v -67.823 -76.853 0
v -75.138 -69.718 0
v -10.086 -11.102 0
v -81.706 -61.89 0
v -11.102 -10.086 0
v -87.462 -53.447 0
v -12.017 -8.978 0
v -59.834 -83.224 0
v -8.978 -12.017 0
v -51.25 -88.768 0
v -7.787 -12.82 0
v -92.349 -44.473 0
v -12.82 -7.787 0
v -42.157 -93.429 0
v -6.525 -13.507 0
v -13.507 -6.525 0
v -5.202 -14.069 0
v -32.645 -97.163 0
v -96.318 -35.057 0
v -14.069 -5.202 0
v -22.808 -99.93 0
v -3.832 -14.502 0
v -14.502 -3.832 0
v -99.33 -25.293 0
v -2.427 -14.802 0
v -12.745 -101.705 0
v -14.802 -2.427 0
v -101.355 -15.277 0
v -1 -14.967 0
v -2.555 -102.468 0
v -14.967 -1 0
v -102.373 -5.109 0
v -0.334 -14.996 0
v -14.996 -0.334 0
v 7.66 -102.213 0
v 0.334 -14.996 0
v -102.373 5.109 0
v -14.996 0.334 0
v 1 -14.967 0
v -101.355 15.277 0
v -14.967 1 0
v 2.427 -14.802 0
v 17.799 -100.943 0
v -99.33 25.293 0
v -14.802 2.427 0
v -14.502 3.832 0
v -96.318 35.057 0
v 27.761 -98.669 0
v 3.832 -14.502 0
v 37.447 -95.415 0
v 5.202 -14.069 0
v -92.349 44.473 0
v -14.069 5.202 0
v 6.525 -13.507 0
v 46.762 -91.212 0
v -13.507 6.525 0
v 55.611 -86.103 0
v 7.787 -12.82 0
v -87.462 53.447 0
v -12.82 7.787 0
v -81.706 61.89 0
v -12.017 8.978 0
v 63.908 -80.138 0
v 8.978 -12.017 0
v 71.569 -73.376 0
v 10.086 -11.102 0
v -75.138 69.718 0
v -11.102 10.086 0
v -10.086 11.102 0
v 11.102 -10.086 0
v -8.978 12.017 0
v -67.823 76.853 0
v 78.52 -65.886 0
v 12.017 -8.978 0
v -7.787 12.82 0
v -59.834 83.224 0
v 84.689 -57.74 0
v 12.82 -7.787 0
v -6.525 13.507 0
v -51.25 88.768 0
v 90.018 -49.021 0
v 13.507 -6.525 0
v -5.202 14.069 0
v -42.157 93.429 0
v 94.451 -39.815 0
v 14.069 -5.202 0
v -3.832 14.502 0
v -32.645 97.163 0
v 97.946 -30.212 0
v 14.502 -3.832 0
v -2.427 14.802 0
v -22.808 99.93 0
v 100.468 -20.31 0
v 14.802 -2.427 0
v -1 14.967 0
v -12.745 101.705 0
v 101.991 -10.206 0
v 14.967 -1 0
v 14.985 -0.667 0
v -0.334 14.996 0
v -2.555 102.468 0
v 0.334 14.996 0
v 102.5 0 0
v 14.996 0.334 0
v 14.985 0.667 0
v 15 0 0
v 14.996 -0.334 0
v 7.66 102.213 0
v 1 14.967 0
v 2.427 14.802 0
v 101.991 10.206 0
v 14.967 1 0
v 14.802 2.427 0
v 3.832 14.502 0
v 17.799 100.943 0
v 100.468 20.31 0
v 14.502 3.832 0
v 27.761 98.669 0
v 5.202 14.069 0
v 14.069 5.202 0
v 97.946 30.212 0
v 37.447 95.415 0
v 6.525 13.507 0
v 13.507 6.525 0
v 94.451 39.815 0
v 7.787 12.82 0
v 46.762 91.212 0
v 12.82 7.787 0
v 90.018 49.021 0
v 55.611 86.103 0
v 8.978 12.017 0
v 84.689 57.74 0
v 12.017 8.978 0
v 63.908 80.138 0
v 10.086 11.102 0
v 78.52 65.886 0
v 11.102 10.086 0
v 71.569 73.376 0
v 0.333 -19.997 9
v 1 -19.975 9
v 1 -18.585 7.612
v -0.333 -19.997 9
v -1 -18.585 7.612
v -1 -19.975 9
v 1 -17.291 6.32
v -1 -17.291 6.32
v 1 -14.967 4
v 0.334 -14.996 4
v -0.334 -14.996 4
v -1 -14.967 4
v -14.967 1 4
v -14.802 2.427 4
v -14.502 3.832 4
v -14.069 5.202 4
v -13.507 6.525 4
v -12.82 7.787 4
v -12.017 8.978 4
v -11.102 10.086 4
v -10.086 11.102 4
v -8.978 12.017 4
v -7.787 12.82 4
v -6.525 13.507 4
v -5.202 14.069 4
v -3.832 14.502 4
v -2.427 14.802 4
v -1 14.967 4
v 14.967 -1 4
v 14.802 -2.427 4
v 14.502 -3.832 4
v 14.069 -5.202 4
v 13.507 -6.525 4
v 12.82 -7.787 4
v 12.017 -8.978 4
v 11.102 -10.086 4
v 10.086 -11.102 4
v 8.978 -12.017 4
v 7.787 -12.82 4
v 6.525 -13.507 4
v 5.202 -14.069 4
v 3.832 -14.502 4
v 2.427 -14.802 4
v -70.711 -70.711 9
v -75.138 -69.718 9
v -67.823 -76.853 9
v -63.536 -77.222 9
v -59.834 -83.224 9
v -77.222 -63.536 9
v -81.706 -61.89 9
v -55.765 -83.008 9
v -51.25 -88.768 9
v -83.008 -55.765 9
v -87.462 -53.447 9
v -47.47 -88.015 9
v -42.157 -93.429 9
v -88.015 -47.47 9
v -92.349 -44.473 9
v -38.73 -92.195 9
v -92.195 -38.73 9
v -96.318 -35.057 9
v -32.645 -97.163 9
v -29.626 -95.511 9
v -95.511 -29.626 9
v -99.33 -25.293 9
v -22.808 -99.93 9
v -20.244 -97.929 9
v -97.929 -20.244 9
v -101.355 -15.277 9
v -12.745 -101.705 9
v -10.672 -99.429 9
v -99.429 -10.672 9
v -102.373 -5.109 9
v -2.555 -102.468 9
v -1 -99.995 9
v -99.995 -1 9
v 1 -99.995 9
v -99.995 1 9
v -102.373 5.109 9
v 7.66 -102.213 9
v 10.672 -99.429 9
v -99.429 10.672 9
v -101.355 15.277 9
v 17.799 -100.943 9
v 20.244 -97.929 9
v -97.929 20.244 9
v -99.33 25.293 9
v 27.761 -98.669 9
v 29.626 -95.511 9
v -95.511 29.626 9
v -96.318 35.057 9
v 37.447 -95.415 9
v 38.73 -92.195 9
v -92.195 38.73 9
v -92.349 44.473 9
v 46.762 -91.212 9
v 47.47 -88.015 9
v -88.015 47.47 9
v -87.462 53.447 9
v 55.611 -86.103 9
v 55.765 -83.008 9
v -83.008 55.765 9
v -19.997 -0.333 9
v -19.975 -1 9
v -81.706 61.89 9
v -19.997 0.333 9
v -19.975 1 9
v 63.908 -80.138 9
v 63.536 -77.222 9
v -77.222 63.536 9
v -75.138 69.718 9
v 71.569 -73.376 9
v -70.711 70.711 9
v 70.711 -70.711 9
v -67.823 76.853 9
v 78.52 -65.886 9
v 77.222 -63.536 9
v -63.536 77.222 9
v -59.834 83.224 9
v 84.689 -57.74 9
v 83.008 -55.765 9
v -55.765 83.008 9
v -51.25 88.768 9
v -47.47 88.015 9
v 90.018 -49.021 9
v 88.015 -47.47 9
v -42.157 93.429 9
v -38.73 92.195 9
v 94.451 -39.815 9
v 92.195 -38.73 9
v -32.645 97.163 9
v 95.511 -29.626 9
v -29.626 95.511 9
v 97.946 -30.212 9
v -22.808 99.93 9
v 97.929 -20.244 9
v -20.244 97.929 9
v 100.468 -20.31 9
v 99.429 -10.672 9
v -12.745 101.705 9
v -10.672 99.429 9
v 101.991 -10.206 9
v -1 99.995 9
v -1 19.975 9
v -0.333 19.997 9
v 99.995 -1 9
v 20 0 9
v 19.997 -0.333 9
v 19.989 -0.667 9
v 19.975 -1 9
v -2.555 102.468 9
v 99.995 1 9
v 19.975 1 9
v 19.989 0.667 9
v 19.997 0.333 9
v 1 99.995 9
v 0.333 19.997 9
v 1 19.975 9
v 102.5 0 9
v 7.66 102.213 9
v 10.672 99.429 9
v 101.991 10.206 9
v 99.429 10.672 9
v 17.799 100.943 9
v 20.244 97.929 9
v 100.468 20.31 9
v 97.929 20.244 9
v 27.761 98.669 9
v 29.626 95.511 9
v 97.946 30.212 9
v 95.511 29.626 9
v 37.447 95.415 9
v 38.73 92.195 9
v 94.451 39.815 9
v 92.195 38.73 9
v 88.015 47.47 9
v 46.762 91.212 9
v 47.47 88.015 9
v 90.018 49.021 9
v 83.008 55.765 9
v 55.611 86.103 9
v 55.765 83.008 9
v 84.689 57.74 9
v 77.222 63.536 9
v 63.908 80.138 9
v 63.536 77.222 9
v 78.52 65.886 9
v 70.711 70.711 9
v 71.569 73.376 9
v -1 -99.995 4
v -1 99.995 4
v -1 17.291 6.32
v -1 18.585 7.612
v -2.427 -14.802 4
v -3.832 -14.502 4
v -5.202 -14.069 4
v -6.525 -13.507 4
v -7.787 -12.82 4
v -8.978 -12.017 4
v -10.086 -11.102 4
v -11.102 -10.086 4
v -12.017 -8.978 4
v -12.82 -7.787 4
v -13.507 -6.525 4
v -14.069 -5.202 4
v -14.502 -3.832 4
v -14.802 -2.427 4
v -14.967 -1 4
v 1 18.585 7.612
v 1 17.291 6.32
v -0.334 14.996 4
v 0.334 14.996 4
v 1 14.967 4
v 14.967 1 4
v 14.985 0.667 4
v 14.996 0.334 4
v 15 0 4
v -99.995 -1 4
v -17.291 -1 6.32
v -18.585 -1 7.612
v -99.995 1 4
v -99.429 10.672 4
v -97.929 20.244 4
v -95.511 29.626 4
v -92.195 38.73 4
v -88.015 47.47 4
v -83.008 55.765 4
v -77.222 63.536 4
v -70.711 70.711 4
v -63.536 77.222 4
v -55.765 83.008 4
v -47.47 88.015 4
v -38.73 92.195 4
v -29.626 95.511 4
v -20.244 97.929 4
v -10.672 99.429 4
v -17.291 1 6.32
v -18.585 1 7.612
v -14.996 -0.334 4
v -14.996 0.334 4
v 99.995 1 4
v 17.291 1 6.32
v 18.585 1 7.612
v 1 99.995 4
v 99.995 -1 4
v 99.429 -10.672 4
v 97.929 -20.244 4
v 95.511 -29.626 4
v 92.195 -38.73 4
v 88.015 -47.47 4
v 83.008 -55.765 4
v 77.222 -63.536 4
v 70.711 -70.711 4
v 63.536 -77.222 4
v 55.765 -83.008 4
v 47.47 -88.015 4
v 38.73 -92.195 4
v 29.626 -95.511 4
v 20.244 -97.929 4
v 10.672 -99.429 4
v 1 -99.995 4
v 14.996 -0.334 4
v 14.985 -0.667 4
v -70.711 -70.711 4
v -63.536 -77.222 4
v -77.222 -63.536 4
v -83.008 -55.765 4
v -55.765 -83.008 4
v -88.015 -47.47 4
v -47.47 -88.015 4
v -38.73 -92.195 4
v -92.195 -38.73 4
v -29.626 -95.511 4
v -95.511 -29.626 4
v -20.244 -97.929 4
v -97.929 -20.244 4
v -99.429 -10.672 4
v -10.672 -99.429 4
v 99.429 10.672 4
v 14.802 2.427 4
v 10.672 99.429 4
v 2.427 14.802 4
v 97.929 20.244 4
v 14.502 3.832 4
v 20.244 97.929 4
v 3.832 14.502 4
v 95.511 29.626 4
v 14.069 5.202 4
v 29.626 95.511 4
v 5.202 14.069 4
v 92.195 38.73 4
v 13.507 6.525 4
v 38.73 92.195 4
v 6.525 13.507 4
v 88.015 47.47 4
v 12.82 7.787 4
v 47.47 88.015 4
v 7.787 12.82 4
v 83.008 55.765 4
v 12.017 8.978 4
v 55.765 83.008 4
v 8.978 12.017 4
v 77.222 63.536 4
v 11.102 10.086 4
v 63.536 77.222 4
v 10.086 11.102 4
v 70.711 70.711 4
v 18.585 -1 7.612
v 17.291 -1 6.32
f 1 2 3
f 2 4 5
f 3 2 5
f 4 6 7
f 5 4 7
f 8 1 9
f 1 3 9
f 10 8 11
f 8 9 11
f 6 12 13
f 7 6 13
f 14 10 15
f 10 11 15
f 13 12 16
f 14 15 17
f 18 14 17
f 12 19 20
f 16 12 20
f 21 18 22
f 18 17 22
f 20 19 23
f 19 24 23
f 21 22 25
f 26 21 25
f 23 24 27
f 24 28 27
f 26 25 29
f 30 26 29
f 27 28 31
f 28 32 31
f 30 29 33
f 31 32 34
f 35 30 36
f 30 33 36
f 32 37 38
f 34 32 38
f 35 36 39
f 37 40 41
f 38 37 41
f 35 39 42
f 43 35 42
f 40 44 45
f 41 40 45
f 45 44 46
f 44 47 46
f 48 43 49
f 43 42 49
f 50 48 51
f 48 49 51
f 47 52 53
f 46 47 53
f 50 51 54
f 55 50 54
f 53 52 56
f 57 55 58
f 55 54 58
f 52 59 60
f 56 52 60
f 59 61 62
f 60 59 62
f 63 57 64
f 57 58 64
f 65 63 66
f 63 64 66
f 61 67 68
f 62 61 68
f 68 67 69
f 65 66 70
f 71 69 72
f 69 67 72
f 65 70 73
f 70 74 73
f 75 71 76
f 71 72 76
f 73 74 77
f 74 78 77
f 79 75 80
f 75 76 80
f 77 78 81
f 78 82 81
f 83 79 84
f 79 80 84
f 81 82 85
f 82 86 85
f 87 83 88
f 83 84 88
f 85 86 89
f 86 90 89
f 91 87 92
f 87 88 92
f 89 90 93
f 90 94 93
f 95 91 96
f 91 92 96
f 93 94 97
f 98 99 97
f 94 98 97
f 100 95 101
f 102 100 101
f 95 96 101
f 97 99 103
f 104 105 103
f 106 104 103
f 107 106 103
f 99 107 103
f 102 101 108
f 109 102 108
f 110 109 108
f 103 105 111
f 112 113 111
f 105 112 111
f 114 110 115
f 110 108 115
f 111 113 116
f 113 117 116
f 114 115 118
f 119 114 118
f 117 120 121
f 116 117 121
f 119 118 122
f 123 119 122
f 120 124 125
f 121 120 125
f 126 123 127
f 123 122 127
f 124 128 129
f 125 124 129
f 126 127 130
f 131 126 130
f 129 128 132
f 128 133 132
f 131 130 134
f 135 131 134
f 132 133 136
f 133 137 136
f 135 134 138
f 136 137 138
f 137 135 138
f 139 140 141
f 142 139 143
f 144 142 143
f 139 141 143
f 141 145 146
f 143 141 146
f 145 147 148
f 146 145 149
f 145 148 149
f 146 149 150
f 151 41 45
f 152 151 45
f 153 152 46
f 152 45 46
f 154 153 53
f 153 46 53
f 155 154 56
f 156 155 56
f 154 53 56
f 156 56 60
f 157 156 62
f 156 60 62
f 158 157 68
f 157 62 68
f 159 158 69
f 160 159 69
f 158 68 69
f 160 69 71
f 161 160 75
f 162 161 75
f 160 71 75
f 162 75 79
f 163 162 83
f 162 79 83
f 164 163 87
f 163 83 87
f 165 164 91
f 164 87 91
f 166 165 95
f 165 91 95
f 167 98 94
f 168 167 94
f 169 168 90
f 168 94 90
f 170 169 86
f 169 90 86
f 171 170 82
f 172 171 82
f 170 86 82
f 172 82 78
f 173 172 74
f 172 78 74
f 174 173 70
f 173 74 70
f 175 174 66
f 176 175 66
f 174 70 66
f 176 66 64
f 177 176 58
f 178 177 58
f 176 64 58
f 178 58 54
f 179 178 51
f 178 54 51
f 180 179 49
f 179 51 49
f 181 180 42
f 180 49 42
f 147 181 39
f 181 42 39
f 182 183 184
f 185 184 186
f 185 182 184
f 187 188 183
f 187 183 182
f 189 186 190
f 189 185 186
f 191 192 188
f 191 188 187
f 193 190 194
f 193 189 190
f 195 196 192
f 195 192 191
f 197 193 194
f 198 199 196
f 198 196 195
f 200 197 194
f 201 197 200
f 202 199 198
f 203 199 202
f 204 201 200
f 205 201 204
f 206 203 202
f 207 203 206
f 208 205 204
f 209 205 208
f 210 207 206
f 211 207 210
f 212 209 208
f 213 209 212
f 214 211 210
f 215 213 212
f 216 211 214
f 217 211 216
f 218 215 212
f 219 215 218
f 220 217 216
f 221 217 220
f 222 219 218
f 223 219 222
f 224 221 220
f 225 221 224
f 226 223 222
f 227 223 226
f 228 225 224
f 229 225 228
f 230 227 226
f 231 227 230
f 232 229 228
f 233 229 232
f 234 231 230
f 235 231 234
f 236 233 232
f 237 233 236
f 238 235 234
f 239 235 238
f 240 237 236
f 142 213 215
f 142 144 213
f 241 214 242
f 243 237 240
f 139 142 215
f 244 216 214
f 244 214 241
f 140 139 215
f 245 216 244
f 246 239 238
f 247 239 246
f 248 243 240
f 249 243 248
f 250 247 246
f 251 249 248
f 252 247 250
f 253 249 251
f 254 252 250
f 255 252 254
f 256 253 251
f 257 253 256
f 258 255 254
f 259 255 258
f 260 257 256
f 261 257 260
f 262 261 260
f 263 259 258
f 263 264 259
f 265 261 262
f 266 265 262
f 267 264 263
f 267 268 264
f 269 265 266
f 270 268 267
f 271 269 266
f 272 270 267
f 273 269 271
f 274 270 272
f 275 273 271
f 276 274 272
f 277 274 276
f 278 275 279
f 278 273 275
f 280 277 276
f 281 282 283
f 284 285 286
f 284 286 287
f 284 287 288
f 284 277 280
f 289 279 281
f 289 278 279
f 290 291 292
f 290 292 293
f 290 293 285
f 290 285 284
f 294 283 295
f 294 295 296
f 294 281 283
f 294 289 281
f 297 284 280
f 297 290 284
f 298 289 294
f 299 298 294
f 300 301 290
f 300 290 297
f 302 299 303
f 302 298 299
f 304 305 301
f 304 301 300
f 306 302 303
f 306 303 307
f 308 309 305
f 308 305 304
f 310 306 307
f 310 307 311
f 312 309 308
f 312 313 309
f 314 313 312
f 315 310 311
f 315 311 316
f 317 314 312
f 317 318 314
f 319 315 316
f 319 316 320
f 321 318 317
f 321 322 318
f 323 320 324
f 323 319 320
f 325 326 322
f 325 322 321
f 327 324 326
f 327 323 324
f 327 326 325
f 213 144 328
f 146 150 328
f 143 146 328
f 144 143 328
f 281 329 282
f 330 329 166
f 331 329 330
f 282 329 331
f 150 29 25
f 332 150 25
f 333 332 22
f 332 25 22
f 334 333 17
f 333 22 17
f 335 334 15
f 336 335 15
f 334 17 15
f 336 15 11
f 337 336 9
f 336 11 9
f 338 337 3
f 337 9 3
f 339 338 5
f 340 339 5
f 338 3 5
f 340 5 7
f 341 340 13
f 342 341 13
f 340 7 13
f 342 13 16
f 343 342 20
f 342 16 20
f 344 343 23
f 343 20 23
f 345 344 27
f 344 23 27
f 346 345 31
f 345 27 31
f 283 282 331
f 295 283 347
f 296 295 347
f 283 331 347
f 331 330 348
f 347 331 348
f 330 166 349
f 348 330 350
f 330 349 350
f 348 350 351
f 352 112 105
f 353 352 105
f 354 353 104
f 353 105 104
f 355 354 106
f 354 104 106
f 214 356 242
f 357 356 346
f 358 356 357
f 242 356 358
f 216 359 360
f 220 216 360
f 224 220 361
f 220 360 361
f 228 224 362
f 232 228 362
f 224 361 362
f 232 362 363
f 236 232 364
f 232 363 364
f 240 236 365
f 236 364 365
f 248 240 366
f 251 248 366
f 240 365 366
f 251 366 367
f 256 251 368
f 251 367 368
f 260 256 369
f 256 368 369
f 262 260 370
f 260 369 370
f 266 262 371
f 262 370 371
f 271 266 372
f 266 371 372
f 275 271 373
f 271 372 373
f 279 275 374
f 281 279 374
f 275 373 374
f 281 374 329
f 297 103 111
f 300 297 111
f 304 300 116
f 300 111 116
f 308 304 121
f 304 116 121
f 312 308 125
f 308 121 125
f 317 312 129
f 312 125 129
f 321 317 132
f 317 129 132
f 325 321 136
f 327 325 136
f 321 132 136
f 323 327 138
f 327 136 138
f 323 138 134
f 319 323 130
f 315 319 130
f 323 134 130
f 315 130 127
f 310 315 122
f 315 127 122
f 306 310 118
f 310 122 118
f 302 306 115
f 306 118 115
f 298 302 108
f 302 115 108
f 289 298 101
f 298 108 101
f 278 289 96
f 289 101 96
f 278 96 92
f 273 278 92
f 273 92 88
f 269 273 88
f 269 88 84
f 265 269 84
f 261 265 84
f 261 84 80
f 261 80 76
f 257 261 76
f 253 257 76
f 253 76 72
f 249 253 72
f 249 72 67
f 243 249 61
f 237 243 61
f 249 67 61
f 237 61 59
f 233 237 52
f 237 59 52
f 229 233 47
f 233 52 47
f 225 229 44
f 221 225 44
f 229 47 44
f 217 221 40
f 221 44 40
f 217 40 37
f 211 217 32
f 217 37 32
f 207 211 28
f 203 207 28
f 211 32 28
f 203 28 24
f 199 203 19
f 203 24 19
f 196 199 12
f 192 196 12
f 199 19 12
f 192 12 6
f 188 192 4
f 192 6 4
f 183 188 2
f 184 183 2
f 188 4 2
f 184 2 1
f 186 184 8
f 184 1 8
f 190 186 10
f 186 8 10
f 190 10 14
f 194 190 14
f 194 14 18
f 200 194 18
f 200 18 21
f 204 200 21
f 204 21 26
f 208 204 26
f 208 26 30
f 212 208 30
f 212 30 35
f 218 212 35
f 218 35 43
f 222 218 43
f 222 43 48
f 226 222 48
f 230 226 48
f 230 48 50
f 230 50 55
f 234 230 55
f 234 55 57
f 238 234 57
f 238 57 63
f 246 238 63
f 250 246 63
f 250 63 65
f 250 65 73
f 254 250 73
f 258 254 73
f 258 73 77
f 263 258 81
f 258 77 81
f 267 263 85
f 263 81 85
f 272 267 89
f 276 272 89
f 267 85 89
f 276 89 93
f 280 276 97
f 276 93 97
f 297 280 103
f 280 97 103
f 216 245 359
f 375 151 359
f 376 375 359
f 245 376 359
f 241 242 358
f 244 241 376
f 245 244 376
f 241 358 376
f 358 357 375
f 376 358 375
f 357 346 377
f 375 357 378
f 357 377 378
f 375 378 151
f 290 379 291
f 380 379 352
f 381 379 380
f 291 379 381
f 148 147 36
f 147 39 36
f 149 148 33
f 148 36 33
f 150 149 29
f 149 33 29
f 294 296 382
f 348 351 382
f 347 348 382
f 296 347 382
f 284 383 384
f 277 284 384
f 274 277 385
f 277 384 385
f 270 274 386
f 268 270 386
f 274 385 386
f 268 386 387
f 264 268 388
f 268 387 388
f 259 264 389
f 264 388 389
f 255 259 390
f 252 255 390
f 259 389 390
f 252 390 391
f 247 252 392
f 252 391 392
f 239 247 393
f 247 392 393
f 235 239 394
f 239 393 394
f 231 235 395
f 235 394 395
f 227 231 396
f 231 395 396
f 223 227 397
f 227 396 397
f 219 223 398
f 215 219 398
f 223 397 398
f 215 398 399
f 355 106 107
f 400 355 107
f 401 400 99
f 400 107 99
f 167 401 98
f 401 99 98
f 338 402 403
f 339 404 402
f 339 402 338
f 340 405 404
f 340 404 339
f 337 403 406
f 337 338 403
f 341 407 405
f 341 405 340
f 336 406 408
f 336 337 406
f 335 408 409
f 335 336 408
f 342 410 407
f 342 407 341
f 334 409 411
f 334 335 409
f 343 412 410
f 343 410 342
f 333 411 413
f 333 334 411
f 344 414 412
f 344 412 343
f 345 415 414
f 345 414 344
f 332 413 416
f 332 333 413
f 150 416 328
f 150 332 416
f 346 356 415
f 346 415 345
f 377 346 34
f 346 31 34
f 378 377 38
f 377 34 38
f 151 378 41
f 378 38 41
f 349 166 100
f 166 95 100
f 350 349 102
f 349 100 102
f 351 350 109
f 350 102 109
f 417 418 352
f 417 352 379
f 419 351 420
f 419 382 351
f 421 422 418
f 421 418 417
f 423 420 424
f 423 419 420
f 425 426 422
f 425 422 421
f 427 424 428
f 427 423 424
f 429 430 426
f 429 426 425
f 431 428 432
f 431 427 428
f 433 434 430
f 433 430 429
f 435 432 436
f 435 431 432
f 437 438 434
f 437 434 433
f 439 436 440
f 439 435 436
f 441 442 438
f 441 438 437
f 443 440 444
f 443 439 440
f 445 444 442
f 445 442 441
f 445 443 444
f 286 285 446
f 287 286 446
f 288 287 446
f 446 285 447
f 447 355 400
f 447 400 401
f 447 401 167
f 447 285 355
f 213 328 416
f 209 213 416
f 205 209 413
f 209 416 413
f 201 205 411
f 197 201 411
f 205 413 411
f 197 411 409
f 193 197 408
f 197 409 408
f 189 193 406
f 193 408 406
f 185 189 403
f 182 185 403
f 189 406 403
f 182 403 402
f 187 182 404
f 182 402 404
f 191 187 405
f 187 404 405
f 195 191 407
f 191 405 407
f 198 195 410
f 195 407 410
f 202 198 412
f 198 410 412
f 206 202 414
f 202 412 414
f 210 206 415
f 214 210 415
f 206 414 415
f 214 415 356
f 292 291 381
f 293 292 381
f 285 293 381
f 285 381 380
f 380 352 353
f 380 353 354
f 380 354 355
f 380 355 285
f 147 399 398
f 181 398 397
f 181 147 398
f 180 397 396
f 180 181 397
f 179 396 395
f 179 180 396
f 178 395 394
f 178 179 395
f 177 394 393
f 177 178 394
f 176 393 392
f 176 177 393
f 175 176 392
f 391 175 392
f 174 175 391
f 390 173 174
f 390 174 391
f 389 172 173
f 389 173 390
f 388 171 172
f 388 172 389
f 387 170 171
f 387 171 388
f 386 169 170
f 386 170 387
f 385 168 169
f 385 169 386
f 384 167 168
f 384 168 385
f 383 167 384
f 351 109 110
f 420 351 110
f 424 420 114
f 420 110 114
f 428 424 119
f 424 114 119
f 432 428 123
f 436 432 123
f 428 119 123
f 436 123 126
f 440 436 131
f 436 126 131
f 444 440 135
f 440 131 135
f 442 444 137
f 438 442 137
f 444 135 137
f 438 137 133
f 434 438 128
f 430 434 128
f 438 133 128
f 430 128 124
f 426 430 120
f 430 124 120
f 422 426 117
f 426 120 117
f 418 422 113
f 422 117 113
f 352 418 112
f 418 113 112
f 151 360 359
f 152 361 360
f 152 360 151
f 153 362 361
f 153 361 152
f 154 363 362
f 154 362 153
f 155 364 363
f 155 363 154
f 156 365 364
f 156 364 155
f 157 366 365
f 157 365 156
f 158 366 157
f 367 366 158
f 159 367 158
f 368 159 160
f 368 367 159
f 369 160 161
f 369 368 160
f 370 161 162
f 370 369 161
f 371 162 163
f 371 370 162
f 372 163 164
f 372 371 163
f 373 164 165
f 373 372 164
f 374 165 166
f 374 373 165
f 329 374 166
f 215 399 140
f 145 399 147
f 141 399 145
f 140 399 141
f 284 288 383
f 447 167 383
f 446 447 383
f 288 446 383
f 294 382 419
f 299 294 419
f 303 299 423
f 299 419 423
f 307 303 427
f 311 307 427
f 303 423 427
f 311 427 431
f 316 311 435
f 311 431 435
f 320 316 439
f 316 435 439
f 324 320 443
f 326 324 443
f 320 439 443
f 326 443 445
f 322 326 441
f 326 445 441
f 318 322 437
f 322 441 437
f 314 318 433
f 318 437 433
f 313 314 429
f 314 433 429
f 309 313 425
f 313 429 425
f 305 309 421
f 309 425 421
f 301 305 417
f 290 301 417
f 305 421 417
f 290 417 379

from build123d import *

# Parameters (mm, degrees)
F1_DEPTH = 4
F0_R     = 102.5
F2_DEPTH = 9
F3_SIZE  = 5


with BuildPart() as f1:
    # F0 (on Top) → F1 (new body)
    with BuildSketch(Plane.XY):
        with BuildLine():
            Line((-1, -99.994999875), (-1, -14.9666295471))
            ThreePointArc((-1, -14.9666295471), (-10.6066017178, -10.6066017178), (-14.9666295471, -1))
            Line((-14.9666295471, -1), (-99.994999875, -1))
            ThreePointArc((-99.994999875, -1), (-70.7106781187, -70.7106781187), (-1, -99.994999875))
        make_face()
    extrude(amount=F1_DEPTH)



with BuildPart() as f1b:
    # F0 (on Top) → F1, piece 2 (new body)
    with BuildSketch(Plane.XY):
        with BuildLine():
            Line((99.994999875, -1), (14.9666295471, -1))
            ThreePointArc((14.9666295471, -1), (10.6066017178, -10.6066017178), (1, -14.9666295471))
            Line((1, -14.9666295471), (1, -99.994999875))
            ThreePointArc((1, -99.994999875), (70.7106781187, -70.7106781187), (99.994999875, -1))
        make_face()
    extrude(amount=F1_DEPTH)


with BuildPart() as f1c:
    # F0 (on Top) → F1, piece 3 (new body)
    with BuildSketch(Plane.XY):
        with BuildLine():
            ThreePointArc((1, 14.9666295471), (10.6066017178, 10.6066017178), (14.9666295471, 1))
            Line((14.9666295471, 1), (99.994999875, 1))
            ThreePointArc((99.994999875, 1), (70.7106781187, 70.7106781187), (1, 99.994999875))
            Line((1, 99.994999875), (1, 14.9666295471))
        make_face()
    extrude(amount=F1_DEPTH)


with BuildPart() as f1d:
    # F0 (on Top) → F1, piece 4 (new body)
    with BuildSketch(Plane.XY):
        with BuildLine():
            ThreePointArc((-14.9666295471, 1), (-10.6066017178, 10.6066017178), (-1, 14.9666295471))
            Line((-1, 14.9666295471), (-1, 99.994999875))
            ThreePointArc((-1, 99.994999875), (-70.7106781187, 70.7106781187), (-99.994999875, 1))
            Line((-99.994999875, 1), (-14.9666295471, 1))
        make_face()
    extrude(amount=F1_DEPTH)


with BuildPart() as f1_1:
    add(f1.part)

    add(f1b.part)  # F2 merges F1b

    add(f1c.part)  # F2 merges F1c

    add(f1d.part)  # F2 merges F1d
    # F0 (on Top) → F2 (join)
    with BuildSketch(Plane.XY):
        Circle(F0_R)
        with BuildLine():
            ThreePointArc((14.9666295471, 1), (14.9916550655, 0.5002783193), (15, 0))
            ThreePointArc((15, 0), (14.9916550655, -0.5002783193), (14.9666295471, -1))
            Line((14.9666295471, -1), (99.994999875, -1))
            ThreePointArc((99.994999875, -1), (70.7106781187, -70.7106781187), (1, -99.994999875))
            Line((1, -99.994999875), (1, -14.9666295471))
            ThreePointArc((1, -14.9666295471), (0, -15), (-1, -14.9666295471))
            Line((-1, -14.9666295471), (-1, -99.994999875))
            ThreePointArc((-1, -99.994999875), (-70.7106781187, -70.7106781187), (-99.994999875, -1))
            Line((-99.994999875, -1), (-14.9666295471, -1))
            ThreePointArc((-14.9666295471, -1), (-15, 0), (-14.9666295471, 1))
            Line((-14.9666295471, 1), (-99.994999875, 1))
            ThreePointArc((-99.994999875, 1), (-70.7106781187, 70.7106781187), (-1, 99.994999875))
            Line((-1, 99.994999875), (-1, 14.9666295471))
            ThreePointArc((-1, 14.9666295471), (0, 15), (1, 14.9666295471))
            Line((1, 14.9666295471), (1, 99.994999875))
            ThreePointArc((1, 99.994999875), (70.7106781187, 70.7106781187), (99.994999875, 1))
            Line((99.994999875, 1), (14.9666295471, 1))
        make_face(mode=Mode.SUBTRACT)
    extrude(amount=F2_DEPTH)

    # F3
    f3_edges = [f1_1.edges().sort_by_distance(p)[0] for p in [
        (0, -15, 9),
        (-15, 0, 9),
        (0, 15, 9),
        (15, 0, 9),
    ]]
    chamfer(f3_edges, length=F3_SIZE)


solid = f1_1.part
